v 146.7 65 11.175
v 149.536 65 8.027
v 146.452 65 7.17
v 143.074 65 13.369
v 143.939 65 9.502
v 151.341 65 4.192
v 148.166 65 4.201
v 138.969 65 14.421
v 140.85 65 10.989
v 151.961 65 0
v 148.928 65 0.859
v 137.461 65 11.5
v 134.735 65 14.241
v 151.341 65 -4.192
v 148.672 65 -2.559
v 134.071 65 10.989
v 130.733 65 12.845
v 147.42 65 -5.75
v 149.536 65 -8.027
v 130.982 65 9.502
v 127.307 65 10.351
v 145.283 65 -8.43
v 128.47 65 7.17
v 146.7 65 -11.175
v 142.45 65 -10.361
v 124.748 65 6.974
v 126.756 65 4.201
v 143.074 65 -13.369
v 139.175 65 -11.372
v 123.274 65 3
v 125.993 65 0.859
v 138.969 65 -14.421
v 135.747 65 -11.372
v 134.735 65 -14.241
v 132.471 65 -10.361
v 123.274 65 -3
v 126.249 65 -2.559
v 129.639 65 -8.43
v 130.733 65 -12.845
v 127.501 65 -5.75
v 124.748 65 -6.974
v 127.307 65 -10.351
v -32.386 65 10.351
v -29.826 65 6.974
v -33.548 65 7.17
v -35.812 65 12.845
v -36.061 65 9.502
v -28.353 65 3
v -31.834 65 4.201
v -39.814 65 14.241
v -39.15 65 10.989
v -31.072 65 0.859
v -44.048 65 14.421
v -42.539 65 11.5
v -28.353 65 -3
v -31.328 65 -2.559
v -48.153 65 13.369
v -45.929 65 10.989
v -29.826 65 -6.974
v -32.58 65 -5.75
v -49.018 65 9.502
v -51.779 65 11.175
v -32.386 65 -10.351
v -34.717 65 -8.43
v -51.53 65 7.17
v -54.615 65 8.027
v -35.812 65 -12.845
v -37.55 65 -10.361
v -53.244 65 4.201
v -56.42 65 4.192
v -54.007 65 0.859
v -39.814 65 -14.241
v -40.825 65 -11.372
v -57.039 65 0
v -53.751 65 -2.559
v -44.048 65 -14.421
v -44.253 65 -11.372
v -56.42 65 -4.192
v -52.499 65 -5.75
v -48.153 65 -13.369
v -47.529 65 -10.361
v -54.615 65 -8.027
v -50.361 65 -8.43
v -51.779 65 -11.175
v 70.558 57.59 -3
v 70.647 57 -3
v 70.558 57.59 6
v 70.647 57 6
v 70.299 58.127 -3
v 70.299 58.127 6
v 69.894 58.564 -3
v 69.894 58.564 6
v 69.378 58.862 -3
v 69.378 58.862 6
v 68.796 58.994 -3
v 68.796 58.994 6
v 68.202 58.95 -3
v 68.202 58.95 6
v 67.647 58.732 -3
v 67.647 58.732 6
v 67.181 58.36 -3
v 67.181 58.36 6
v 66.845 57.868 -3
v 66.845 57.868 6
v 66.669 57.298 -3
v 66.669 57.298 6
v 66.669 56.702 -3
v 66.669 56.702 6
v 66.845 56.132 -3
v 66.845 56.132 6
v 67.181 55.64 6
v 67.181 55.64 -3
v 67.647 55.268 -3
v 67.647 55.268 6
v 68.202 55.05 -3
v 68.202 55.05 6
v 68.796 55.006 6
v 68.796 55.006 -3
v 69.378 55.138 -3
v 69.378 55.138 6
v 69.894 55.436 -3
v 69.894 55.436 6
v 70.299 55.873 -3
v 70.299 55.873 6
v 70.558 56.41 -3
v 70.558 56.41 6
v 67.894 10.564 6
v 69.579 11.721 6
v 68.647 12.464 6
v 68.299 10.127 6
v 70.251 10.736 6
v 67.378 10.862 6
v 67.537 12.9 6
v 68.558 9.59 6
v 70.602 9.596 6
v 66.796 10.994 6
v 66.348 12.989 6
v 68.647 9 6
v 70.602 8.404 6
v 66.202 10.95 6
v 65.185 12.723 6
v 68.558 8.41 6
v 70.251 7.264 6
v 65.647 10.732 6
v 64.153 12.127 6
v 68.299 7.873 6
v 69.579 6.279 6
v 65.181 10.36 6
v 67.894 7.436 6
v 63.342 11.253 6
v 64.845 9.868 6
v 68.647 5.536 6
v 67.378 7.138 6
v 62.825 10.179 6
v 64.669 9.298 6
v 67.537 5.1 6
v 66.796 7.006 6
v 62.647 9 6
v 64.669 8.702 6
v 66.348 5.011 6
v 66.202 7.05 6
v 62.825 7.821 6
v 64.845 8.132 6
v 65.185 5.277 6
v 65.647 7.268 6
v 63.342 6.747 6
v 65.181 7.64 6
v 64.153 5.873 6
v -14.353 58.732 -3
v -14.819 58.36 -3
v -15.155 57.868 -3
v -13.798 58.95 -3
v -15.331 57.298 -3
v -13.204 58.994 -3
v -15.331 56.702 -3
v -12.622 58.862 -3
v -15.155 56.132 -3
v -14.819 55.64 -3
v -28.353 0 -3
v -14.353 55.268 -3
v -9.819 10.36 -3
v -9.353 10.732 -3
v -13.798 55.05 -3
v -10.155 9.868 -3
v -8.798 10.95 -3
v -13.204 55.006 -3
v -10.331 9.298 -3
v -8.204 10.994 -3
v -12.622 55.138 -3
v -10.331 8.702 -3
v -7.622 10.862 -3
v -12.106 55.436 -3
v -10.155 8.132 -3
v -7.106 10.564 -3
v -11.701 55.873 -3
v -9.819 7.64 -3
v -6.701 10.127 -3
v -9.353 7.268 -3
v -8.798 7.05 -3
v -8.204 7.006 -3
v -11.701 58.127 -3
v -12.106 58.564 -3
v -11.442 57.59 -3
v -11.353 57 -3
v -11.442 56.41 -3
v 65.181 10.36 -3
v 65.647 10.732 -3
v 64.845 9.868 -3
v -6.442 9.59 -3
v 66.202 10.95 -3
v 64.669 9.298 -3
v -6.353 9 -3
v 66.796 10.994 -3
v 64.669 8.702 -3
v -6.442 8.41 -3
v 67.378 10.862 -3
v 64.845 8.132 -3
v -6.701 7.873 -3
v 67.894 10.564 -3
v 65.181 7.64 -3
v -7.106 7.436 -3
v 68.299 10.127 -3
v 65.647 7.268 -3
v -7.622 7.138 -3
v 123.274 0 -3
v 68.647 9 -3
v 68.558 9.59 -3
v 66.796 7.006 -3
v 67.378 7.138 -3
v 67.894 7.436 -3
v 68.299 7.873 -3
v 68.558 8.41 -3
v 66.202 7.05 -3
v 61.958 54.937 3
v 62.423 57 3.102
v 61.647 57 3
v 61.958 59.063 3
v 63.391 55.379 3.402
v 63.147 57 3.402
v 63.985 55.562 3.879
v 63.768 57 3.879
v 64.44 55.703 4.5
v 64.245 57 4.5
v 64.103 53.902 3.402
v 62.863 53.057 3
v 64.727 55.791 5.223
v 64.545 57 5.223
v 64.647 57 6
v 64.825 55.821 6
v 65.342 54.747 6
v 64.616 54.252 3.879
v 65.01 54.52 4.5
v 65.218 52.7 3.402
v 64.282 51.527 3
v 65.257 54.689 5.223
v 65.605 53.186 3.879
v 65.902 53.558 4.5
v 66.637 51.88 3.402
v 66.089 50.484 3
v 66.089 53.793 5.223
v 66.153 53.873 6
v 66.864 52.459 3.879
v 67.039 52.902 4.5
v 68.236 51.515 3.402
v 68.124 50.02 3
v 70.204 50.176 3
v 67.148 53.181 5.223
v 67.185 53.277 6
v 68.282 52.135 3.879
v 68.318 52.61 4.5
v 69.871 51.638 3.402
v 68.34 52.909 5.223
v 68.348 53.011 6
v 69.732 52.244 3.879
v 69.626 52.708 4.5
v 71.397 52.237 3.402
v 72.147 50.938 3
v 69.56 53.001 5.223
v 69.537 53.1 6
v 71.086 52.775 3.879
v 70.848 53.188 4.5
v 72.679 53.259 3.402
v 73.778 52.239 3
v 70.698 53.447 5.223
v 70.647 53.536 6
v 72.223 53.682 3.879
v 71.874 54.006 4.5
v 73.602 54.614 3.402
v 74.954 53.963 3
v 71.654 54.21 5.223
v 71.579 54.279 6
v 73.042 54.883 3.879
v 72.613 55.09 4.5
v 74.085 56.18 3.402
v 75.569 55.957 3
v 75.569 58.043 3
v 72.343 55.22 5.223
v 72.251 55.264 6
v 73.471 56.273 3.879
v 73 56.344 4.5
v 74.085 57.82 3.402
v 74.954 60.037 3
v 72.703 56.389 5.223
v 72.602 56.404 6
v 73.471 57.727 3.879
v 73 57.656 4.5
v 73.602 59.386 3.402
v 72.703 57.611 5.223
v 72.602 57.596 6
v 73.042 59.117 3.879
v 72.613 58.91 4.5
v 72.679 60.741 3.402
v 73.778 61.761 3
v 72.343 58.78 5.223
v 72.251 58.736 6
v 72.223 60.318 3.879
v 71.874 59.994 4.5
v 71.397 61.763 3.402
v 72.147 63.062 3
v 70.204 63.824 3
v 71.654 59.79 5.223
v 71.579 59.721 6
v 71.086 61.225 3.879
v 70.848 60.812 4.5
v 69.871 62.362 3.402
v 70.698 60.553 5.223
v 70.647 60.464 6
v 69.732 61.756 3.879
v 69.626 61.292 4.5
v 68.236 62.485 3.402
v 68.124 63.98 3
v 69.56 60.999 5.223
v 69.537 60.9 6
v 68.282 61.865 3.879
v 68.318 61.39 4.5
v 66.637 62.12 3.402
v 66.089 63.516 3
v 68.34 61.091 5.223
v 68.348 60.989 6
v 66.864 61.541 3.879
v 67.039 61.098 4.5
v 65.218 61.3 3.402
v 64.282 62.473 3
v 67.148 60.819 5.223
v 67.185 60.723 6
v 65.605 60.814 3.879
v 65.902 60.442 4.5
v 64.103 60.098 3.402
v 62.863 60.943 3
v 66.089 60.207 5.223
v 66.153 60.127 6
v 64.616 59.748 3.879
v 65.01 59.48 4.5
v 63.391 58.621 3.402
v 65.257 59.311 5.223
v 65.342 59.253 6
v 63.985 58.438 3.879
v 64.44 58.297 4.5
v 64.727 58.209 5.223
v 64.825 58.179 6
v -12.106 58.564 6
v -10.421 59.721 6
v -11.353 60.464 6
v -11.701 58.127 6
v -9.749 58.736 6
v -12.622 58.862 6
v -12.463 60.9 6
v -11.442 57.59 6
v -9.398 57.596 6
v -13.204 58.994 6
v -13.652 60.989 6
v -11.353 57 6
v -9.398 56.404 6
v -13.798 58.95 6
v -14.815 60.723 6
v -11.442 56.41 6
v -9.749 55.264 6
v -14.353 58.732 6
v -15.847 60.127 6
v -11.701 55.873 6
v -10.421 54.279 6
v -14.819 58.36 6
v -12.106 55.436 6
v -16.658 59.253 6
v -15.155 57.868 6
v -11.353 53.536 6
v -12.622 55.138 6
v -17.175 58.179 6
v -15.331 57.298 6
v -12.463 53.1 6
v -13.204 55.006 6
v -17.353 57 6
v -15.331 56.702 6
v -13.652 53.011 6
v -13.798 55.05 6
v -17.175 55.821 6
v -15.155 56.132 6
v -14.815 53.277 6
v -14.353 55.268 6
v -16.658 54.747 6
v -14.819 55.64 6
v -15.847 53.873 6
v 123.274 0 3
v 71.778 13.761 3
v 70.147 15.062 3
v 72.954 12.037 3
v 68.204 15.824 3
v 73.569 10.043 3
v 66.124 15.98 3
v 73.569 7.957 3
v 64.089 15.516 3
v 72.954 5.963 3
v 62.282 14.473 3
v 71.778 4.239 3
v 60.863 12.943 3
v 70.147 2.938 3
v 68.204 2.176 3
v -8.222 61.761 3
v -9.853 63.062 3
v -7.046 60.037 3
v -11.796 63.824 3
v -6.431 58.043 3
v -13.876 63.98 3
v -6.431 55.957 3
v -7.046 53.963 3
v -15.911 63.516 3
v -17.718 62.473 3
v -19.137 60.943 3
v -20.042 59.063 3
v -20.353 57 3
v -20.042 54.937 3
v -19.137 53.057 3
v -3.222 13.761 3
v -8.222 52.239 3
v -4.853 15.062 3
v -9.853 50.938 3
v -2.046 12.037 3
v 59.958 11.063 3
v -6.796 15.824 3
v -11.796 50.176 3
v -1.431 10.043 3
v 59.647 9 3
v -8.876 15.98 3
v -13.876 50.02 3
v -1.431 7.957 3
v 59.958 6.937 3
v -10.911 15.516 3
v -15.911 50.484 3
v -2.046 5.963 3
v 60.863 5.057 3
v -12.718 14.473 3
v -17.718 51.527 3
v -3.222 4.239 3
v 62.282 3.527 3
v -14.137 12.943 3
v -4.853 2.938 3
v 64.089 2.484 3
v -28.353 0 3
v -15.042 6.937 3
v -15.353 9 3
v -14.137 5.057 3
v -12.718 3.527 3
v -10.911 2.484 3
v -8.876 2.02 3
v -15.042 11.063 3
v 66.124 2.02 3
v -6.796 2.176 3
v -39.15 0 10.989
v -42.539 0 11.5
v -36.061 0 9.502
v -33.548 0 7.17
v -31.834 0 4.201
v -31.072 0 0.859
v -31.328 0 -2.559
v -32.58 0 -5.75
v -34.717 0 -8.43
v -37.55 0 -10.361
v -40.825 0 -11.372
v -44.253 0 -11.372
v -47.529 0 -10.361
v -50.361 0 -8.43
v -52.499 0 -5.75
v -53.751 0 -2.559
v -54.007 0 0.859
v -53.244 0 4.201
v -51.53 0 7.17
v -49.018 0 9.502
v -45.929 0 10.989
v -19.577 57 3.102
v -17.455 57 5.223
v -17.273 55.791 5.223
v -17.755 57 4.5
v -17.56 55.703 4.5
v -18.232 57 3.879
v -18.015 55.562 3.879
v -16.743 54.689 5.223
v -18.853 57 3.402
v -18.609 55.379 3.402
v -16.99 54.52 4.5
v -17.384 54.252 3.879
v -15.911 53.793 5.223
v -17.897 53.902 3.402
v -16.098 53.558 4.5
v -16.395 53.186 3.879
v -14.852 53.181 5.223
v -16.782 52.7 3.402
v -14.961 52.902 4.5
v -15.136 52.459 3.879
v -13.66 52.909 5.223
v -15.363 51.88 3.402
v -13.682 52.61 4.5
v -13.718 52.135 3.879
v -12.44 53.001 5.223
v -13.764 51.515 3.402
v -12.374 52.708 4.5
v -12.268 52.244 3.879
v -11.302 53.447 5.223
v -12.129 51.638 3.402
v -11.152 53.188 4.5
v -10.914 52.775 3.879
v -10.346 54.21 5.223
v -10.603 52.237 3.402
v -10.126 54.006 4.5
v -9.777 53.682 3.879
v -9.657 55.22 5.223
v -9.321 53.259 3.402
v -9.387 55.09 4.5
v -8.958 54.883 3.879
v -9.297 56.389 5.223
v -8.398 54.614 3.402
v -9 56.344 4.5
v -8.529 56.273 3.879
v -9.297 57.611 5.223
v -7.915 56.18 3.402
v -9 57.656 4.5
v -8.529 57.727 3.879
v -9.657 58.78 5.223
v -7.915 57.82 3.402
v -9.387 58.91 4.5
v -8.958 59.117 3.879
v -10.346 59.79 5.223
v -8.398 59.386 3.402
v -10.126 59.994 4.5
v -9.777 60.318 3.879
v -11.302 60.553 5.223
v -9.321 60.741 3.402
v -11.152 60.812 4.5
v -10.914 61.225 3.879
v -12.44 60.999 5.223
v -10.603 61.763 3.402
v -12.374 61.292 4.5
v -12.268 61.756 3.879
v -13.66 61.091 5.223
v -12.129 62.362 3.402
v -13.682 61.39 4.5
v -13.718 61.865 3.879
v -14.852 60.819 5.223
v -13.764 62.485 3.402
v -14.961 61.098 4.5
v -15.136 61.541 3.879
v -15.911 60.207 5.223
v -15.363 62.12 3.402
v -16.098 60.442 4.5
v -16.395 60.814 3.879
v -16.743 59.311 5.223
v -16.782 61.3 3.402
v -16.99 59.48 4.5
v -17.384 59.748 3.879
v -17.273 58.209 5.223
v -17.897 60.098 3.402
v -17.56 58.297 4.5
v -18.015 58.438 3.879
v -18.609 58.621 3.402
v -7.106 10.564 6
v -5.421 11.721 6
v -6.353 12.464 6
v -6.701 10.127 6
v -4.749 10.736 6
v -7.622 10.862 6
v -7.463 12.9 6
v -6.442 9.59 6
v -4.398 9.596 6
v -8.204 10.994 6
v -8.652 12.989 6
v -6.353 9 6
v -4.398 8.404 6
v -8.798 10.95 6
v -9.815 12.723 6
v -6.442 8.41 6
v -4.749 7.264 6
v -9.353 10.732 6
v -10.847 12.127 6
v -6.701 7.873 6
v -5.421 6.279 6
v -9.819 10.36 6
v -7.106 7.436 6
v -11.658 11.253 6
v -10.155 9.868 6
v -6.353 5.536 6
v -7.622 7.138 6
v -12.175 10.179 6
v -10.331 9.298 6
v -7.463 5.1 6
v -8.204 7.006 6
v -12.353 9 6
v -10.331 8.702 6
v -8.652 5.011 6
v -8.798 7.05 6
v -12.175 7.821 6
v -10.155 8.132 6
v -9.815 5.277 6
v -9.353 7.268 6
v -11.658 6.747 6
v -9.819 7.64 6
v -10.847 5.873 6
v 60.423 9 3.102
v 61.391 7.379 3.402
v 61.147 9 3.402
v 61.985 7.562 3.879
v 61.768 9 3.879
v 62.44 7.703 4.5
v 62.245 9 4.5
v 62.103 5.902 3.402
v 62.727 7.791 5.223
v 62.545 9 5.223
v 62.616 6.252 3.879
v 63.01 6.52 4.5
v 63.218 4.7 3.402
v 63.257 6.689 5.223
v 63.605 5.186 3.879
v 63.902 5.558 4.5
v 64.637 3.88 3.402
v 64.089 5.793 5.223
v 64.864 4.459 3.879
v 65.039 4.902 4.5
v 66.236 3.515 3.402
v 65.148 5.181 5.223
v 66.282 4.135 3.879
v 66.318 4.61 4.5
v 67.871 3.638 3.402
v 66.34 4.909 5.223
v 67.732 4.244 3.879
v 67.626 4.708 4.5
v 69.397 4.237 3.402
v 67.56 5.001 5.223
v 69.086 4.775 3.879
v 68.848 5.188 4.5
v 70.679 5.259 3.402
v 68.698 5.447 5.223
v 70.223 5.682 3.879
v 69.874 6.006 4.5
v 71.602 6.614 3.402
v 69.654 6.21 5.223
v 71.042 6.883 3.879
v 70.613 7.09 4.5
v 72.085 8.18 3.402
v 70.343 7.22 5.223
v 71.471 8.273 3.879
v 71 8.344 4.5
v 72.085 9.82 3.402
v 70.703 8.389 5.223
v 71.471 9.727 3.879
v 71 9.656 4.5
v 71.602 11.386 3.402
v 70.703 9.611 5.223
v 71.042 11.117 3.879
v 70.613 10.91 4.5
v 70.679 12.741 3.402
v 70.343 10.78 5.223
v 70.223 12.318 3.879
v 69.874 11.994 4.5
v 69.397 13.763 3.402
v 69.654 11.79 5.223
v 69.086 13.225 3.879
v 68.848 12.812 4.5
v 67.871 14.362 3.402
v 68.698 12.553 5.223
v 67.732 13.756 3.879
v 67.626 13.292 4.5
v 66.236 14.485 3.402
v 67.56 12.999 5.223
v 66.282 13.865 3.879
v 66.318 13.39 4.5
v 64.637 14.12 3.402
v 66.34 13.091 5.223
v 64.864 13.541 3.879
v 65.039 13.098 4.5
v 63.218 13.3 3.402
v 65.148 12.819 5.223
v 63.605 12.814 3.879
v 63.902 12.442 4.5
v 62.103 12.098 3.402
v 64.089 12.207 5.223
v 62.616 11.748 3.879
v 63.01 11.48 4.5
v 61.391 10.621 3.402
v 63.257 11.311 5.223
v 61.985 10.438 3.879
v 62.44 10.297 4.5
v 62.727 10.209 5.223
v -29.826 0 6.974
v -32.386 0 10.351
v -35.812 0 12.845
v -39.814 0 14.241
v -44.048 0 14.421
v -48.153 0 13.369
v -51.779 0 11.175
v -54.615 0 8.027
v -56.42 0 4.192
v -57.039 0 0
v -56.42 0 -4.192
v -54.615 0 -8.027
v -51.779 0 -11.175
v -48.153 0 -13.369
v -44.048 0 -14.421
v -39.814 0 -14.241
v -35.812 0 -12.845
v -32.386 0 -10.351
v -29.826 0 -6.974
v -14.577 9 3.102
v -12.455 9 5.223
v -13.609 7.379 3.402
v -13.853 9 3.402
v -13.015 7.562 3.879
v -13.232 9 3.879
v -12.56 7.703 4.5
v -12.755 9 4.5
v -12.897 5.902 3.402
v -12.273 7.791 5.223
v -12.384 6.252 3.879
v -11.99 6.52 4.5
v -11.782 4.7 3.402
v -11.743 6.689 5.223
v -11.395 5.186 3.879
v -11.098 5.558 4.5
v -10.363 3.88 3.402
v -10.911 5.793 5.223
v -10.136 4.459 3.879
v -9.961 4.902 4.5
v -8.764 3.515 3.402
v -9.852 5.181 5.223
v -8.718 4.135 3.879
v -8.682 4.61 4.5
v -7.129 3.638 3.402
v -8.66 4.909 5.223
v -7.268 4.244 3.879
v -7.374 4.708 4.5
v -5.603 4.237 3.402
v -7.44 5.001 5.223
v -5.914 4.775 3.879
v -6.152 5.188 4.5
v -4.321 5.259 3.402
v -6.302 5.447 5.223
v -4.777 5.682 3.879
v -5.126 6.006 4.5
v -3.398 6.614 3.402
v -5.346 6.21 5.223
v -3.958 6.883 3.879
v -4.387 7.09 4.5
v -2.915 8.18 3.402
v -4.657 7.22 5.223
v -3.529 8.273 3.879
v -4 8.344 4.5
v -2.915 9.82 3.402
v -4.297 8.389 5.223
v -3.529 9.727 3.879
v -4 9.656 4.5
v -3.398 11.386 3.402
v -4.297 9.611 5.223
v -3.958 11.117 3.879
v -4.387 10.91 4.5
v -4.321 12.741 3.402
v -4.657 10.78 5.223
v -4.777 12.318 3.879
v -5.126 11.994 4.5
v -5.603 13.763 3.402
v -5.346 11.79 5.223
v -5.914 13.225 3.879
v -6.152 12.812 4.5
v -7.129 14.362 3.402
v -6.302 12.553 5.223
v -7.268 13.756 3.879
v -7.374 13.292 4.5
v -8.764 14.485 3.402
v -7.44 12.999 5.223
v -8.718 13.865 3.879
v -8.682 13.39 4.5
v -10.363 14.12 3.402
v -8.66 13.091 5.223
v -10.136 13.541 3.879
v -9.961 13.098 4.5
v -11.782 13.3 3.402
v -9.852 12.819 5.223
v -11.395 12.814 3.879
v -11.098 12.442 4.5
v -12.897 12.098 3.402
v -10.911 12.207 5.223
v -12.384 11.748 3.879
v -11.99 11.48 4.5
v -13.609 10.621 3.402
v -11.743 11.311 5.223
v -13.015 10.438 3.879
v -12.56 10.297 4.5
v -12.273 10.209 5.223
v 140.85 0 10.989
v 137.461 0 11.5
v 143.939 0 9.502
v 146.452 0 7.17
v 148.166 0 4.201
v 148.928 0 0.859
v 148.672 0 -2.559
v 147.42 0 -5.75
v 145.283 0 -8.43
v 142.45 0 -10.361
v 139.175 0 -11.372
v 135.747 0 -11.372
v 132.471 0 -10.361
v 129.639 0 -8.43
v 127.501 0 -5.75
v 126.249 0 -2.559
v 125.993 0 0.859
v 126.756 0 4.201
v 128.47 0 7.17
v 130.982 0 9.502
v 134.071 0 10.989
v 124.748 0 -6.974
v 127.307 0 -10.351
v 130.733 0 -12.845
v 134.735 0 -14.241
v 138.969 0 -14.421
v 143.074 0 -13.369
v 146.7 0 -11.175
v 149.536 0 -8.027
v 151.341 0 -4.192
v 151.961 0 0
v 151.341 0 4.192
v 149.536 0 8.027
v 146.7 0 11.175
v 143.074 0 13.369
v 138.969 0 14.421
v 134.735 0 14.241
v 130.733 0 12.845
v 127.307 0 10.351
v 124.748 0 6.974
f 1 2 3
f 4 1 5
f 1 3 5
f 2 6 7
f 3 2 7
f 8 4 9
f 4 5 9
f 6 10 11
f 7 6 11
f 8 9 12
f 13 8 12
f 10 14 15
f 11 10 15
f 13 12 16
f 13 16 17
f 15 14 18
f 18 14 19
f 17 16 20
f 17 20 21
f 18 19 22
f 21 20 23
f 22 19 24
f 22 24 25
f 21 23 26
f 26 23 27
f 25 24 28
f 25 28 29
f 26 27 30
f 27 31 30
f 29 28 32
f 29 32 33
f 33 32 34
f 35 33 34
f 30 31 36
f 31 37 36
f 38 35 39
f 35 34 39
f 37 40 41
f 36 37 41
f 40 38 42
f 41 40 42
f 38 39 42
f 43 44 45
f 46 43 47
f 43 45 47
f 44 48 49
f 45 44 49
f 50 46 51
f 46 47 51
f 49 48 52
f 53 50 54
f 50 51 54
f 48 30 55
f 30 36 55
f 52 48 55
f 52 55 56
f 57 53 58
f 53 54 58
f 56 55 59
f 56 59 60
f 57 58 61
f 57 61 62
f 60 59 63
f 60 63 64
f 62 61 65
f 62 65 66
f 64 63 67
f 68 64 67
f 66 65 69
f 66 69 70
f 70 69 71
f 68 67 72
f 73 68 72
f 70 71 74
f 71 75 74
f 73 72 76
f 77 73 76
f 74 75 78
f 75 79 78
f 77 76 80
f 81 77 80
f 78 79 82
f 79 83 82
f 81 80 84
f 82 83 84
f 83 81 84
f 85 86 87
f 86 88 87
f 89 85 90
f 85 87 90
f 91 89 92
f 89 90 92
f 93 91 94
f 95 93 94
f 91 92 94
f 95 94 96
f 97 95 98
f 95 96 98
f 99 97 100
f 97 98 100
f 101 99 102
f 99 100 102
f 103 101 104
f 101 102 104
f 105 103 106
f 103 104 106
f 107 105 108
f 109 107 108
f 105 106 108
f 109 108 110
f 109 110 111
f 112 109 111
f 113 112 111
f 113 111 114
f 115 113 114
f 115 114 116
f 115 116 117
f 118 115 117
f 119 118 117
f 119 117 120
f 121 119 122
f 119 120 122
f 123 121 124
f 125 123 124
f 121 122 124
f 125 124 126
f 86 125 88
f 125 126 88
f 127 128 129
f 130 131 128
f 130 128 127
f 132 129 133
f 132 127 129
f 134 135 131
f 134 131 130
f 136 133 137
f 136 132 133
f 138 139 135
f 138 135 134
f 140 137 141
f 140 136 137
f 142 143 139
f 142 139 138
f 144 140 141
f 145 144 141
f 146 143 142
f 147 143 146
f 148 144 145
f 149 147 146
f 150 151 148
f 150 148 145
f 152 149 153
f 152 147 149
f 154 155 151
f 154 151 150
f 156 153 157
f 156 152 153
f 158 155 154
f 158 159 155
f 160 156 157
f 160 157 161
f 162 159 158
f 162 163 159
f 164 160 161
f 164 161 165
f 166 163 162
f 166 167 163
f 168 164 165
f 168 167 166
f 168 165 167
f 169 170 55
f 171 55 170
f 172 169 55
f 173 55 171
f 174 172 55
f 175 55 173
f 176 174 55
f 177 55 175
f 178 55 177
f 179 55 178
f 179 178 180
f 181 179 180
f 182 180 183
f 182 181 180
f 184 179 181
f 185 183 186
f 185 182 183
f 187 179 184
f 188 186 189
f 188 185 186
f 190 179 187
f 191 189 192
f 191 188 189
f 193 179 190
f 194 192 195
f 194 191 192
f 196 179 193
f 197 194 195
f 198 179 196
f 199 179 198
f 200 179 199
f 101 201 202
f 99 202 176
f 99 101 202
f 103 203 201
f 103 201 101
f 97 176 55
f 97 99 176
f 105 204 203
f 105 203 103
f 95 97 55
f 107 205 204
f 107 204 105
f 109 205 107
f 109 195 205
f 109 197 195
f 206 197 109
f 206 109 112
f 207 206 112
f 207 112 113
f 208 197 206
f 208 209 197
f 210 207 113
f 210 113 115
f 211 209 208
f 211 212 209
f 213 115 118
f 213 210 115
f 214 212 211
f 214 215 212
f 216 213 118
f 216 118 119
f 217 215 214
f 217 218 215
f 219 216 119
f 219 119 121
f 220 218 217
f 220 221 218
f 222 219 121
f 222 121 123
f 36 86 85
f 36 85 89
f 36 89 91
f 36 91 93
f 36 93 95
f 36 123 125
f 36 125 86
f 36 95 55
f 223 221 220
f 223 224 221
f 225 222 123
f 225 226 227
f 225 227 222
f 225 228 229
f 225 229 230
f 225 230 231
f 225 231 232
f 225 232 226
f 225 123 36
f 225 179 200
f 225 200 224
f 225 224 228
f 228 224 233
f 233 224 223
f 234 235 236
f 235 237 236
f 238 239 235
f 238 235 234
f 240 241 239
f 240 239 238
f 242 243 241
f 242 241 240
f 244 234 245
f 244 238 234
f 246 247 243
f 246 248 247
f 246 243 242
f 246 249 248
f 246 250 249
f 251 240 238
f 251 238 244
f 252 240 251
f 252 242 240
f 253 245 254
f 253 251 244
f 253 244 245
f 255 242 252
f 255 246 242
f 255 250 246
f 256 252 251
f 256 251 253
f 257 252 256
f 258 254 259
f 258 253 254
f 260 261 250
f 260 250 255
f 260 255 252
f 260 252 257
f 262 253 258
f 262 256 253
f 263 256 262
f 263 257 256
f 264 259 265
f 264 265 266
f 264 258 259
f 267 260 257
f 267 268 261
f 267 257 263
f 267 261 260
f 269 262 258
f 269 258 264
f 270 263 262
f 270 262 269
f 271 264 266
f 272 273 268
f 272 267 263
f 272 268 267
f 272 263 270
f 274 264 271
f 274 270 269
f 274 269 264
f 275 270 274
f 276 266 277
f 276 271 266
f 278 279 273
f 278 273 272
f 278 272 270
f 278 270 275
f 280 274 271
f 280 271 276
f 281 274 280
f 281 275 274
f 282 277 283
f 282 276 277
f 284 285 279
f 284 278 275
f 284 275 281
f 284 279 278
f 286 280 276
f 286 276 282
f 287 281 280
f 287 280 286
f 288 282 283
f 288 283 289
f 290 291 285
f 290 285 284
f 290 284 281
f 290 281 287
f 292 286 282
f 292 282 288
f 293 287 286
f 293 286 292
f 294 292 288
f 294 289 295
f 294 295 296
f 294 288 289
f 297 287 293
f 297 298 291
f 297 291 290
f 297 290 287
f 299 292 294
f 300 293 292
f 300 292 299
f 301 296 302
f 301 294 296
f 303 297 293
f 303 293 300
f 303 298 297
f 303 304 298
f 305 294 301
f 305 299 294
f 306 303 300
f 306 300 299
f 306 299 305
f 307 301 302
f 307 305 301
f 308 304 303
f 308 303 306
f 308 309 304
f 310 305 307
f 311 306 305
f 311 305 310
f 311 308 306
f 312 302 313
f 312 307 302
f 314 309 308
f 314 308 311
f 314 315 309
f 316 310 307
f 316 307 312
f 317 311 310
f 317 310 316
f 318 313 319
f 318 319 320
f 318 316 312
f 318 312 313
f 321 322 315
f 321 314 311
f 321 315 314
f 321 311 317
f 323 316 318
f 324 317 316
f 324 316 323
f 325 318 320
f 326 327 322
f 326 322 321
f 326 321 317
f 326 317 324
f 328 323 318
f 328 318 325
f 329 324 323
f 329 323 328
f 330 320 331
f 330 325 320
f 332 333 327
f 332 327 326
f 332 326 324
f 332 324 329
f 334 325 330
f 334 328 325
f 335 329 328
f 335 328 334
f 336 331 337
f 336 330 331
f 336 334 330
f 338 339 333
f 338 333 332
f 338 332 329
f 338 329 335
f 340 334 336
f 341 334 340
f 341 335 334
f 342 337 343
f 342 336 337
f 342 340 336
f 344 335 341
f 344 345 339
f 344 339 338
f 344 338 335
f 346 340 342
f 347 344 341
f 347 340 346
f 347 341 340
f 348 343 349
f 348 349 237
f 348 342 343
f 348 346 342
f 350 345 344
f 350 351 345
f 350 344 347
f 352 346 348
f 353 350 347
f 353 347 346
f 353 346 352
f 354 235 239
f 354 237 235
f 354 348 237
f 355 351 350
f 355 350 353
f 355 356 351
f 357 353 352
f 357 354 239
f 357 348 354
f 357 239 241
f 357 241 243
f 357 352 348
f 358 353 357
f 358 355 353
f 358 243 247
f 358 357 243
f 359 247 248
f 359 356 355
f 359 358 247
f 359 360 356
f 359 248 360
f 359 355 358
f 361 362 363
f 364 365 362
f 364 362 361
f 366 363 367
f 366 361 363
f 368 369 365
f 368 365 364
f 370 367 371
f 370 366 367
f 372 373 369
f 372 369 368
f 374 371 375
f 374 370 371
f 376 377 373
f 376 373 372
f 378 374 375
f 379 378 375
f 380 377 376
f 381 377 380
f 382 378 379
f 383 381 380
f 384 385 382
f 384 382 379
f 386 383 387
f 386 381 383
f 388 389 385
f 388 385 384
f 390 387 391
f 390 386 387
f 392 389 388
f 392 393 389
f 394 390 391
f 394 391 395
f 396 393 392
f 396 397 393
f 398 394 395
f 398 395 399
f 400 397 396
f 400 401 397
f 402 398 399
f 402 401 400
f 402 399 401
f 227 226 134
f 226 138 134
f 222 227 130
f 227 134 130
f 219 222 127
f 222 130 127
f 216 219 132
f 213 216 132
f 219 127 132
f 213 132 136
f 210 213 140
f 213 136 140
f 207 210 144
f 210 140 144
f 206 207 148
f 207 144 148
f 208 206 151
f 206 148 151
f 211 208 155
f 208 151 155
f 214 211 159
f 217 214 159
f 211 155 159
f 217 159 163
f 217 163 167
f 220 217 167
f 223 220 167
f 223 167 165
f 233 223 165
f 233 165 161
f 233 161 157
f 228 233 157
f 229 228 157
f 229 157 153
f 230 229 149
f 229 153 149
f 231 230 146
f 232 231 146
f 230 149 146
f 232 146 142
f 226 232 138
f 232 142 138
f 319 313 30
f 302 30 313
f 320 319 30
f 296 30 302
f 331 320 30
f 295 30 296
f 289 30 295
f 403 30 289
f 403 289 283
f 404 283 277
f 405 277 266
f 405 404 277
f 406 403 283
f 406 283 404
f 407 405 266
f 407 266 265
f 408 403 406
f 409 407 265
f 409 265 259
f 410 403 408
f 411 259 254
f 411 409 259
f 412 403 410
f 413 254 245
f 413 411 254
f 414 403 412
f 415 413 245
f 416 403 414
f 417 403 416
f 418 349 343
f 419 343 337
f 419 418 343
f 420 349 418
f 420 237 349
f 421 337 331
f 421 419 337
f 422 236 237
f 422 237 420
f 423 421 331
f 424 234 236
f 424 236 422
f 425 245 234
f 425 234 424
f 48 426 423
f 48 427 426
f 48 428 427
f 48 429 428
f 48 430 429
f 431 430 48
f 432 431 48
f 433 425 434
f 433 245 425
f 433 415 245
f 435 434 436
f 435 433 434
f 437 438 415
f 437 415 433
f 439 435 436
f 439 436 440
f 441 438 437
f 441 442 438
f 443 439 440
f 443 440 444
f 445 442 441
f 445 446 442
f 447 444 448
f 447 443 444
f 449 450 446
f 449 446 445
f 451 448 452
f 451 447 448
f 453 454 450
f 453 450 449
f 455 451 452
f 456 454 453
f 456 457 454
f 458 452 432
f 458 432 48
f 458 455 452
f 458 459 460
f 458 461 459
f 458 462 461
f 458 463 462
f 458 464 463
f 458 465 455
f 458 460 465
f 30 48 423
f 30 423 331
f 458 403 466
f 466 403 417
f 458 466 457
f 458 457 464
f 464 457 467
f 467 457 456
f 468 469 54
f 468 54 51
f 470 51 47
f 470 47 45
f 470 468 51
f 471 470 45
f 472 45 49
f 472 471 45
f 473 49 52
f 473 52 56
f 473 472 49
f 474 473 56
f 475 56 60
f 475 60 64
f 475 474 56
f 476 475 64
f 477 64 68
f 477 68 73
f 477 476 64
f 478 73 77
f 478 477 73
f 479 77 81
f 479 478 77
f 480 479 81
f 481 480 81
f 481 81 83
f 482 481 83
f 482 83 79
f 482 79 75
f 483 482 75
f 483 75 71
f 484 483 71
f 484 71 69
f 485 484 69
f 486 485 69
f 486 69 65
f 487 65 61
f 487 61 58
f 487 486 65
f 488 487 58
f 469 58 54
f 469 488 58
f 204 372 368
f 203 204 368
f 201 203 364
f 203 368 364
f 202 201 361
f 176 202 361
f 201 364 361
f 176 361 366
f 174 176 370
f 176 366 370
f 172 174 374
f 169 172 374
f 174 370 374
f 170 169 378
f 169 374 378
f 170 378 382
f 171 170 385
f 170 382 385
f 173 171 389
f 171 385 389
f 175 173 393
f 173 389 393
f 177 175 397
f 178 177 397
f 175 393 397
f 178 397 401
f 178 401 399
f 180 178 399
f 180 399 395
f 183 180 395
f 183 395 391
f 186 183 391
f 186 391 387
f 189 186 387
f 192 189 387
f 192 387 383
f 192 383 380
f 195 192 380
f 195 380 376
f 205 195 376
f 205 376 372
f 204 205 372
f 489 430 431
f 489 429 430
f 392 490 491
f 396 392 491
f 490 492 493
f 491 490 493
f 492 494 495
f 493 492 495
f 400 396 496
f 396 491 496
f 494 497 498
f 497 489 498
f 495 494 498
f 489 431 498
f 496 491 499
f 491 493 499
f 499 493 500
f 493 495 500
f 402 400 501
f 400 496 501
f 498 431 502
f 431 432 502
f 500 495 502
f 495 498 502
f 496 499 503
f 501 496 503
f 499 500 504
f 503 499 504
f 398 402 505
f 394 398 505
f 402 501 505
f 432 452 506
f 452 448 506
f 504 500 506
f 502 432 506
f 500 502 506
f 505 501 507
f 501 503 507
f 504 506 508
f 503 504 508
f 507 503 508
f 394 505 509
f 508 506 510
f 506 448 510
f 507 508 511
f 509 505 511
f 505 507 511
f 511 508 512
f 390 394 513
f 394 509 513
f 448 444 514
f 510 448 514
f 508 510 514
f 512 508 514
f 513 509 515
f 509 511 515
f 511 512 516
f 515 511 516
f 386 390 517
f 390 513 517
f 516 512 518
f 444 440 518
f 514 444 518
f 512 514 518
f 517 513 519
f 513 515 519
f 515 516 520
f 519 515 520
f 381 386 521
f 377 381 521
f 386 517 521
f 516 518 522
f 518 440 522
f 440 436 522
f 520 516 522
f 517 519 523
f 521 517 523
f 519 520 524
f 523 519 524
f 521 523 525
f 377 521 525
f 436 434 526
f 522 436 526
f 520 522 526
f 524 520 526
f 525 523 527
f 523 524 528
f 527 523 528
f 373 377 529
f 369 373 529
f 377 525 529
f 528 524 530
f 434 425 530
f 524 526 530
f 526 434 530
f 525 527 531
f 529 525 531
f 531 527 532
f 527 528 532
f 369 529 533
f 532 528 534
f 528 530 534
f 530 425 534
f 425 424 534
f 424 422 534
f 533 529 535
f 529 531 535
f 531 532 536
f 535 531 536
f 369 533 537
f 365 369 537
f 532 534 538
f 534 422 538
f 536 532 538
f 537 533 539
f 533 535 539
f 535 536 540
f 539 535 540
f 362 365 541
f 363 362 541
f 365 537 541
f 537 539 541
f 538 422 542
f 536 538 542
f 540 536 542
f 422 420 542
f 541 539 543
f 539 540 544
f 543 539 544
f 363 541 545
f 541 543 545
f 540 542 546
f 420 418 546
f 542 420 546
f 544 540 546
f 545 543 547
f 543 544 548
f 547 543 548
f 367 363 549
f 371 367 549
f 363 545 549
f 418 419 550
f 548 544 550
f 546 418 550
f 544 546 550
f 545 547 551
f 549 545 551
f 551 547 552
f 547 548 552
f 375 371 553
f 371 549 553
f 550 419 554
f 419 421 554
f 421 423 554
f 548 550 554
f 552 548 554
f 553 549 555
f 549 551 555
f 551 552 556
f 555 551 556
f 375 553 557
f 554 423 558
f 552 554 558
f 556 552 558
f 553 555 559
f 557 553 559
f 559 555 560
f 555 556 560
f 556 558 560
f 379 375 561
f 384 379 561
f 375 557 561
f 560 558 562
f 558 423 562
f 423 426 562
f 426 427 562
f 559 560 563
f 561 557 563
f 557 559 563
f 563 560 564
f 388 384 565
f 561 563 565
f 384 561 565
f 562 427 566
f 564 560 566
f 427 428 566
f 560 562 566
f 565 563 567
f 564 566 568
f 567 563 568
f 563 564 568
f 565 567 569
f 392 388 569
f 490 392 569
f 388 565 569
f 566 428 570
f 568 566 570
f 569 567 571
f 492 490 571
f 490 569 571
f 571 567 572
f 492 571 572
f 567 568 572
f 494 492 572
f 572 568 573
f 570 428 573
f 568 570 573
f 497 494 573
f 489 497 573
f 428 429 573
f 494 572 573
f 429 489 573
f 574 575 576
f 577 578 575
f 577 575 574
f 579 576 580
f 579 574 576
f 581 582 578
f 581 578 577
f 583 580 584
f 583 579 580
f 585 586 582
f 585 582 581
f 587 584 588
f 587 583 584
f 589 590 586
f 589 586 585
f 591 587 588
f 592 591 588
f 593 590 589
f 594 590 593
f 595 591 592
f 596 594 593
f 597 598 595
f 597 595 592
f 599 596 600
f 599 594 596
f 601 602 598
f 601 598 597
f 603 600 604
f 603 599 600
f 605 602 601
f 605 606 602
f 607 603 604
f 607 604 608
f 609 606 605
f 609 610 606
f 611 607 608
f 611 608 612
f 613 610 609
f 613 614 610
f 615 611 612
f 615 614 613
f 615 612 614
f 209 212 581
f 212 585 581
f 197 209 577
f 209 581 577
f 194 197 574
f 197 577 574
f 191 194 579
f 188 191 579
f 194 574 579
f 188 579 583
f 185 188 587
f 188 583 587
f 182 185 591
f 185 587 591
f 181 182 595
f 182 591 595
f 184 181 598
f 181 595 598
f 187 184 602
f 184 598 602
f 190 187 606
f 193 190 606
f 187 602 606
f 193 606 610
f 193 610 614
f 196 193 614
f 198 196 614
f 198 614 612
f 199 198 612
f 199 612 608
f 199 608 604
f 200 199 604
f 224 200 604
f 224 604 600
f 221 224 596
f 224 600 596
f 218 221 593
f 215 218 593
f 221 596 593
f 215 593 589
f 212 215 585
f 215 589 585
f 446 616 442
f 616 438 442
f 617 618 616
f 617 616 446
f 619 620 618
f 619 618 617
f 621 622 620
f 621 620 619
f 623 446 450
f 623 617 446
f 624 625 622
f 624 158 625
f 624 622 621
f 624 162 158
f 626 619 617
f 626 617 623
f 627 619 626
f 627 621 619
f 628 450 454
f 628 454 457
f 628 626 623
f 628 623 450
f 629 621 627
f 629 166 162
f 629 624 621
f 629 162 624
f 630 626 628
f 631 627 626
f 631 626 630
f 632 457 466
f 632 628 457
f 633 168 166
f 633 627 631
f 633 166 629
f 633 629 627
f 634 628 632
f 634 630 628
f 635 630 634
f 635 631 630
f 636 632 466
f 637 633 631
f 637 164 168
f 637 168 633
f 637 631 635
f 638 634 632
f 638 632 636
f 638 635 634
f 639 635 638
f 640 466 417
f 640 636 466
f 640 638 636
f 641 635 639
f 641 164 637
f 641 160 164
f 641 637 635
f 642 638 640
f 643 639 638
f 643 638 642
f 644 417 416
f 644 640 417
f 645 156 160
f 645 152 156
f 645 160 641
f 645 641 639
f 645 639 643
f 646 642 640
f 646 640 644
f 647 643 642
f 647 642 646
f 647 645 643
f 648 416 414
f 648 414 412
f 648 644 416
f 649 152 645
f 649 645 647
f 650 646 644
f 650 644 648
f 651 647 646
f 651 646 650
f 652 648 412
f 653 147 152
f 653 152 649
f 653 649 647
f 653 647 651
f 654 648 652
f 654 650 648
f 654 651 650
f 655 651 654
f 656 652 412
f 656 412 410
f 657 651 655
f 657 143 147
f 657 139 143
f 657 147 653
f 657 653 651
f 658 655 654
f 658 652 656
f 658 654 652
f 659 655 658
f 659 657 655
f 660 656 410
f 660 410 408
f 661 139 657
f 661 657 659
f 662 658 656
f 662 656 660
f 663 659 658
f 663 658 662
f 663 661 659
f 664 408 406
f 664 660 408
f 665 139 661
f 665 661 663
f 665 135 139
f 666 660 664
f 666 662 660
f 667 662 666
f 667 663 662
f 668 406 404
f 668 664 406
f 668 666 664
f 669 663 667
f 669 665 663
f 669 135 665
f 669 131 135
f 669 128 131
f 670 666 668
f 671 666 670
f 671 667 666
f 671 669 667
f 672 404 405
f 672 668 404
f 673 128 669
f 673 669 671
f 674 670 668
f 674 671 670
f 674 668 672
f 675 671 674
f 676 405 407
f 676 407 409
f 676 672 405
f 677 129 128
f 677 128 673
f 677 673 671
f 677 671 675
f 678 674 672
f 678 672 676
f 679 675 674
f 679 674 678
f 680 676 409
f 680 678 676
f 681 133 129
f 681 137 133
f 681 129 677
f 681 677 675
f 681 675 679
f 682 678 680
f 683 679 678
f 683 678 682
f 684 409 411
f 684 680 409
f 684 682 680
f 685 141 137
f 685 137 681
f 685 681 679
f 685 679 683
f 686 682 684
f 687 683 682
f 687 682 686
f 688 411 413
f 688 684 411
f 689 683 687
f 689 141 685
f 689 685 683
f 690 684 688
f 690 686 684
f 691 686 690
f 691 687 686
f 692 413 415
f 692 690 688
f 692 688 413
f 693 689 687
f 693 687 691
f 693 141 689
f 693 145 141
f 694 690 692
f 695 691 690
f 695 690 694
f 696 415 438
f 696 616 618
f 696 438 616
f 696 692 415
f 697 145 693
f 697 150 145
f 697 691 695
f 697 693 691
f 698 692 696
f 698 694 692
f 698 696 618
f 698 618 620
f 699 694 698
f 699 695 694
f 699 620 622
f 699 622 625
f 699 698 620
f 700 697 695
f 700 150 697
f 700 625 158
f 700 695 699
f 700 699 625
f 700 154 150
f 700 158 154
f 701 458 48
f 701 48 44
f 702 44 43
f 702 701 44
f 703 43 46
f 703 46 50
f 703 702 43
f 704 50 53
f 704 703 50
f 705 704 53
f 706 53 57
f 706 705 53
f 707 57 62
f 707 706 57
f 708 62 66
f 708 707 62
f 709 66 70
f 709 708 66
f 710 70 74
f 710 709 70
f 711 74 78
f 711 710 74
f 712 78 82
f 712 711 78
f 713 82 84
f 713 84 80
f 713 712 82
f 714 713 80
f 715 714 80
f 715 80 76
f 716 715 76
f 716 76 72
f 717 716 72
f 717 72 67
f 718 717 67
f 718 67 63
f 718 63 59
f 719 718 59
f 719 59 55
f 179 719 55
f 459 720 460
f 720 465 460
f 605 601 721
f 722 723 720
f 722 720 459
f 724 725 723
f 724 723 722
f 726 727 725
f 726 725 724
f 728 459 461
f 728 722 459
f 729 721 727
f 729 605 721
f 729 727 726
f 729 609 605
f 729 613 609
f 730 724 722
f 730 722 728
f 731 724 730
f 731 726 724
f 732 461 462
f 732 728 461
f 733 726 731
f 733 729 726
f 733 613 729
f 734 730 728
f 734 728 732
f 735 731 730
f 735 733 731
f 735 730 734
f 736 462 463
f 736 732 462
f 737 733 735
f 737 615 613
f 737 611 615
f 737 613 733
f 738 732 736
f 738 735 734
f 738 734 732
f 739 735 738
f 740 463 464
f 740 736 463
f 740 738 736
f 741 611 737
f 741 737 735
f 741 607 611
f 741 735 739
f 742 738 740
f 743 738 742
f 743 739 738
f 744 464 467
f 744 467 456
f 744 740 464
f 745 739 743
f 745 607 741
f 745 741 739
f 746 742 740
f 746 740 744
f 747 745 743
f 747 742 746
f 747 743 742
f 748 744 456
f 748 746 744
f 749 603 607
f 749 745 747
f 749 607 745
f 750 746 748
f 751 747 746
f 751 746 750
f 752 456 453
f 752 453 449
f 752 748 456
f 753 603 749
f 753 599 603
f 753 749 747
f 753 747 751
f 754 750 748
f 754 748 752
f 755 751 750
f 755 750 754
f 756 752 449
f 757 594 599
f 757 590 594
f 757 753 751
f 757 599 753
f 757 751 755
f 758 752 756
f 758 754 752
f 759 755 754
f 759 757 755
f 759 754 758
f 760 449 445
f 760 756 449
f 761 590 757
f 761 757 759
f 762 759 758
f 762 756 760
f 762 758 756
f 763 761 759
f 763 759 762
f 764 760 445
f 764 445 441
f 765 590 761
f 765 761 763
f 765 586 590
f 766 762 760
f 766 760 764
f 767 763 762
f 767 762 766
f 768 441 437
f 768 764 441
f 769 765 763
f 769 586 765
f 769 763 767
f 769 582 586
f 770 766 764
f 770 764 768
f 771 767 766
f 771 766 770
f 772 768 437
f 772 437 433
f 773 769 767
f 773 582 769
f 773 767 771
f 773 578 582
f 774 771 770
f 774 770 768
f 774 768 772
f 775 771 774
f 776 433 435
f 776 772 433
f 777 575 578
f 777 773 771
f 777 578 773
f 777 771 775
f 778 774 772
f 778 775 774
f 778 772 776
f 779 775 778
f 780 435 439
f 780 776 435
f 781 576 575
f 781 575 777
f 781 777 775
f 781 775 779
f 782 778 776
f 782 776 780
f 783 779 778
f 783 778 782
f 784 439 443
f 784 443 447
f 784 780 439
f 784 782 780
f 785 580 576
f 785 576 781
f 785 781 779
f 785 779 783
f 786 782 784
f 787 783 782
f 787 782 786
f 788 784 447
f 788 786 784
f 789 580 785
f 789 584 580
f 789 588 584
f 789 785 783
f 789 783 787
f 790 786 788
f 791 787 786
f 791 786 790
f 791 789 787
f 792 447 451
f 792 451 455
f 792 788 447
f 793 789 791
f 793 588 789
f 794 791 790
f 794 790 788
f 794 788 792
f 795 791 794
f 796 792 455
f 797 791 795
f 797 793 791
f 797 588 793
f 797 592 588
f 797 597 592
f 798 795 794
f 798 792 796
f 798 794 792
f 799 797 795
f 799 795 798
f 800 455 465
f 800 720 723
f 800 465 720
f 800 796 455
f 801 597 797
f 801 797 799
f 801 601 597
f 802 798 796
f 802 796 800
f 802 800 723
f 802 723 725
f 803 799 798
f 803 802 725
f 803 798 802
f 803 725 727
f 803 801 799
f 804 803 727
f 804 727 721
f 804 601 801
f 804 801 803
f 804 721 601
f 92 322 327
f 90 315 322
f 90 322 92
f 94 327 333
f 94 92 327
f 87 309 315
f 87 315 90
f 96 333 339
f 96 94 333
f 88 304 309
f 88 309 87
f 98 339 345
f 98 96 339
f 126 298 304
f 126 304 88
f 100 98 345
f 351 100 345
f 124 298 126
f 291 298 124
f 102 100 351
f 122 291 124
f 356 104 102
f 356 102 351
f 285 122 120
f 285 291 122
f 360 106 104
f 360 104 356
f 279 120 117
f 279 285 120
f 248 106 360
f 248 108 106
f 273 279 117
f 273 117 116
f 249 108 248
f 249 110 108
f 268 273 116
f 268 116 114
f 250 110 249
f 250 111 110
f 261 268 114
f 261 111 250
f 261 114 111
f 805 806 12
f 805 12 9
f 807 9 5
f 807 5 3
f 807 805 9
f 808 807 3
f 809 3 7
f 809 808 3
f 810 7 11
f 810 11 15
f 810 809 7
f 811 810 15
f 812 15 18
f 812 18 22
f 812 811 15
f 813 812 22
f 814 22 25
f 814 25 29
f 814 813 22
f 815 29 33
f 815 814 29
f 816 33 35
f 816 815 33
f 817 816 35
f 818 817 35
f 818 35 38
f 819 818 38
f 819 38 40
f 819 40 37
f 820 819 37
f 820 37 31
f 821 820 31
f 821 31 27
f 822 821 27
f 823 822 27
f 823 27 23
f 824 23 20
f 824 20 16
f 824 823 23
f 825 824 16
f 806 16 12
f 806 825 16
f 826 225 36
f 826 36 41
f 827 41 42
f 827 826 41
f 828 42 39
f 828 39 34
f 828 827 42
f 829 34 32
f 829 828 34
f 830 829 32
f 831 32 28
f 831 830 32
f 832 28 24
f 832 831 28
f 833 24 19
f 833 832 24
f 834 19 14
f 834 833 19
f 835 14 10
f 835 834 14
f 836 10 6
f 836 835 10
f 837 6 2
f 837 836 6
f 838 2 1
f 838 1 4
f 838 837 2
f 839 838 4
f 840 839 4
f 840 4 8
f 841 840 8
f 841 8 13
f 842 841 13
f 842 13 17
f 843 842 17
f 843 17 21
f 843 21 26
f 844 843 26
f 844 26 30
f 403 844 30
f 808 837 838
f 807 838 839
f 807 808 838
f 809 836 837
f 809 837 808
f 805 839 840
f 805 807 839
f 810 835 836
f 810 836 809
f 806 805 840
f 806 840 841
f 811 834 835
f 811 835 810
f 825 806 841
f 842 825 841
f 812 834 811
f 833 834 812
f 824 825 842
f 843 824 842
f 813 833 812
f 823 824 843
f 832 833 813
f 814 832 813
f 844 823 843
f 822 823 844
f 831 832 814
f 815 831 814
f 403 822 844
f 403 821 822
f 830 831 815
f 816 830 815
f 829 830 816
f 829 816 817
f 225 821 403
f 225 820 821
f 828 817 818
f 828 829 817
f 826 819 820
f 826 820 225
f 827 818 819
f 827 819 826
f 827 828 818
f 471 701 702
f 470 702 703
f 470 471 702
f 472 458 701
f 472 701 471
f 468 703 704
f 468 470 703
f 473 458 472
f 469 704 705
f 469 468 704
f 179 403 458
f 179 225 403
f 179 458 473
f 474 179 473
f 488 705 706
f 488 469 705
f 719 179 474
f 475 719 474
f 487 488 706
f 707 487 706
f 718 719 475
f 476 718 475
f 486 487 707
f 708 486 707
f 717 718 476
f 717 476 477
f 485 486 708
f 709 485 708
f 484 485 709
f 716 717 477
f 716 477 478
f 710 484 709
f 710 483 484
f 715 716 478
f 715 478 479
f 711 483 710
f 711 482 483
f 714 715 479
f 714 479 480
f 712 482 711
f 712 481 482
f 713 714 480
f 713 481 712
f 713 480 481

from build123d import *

# Parameters (mm, degrees)
SKETCH1_R           = 11.5
BOSS_EXTRUDE1_DEPTH = 65
SKETCH2_R           = 2
CUT_EXTRUDE1_DEPTH  = 10
BOSS_EXTRUDE2_START = 3
SKETCH3_R           = 4
SKETCH3_R_2         = 2
BOSS_EXTRUDE2_DEPTH = 3
FILLET1_R           = 3


with BuildPart() as part:
    # Sketch1 → Boss-Extrude1 (new body)
    with BuildSketch(Plane(origin=(0, 0, 0), x_dir=(1, 0, 0), z_dir=(0, 1, 0))):
        with BuildLine():
            Line((-28.353157483, 3), (123.274320599, 3))
            ThreePointArc((123.274320599, 3), (151.960581558, 0), (123.274320599, -3))
            Line((123.274320599, -3), (-28.353157483, -3))
            ThreePointArc((-28.353157483, -3), (-57.039418442, 0), (-28.353157483, 3))
        make_face()
        with Locations(Location((-42.539418442, 0, 0), (0, 0, 270))):
            Circle(SKETCH1_R, mode=Mode.SUBTRACT)
        with Locations(Location((137.460581558, 0, 0), (0, 0, 270))):
            Circle(SKETCH1_R, mode=Mode.SUBTRACT)
    extrude(amount=BOSS_EXTRUDE1_DEPTH)

    # Sketch2 → Cut-Extrude1 (cut)
    with BuildSketch(Plane.XY.offset(3)):
        with Locations((-13.353157483, 57)):
            Circle(SKETCH2_R)
        with Locations((-8.353157483, 9)):
            Circle(SKETCH2_R)
        with Locations((66.646842517, 9)):
            Circle(SKETCH2_R)
        with Locations((68.646842517, 57)):
            Circle(SKETCH2_R)
    extrude(amount=-CUT_EXTRUDE1_DEPTH, mode=Mode.SUBTRACT)

    # Sketch3 → Boss-Extrude2 (add)
    # profile 1 of 4: a face of its own
    with BuildSketch(Plane.XY.offset(3).offset(BOSS_EXTRUDE2_START)):
        with Locations(Location((-13.353157483, 57, 0), (0, 0, 180))):
            Circle(SKETCH3_R)
        with Locations((-13.353157483, 57)):
            Circle(SKETCH3_R_2, mode=Mode.SUBTRACT)
    # profile 2 of 4: a face of its own
    with BuildSketch(Plane.XY.offset(3).offset(BOSS_EXTRUDE2_START)):
        with Locations(Location((68.646842517, 57, 0), (0, 0, 180))):
            Circle(SKETCH3_R)
        with Locations((68.646842517, 57)):
            Circle(SKETCH3_R_2, mode=Mode.SUBTRACT)
    # profile 3 of 4: a face of its own
    with BuildSketch(Plane.XY.offset(3).offset(BOSS_EXTRUDE2_START)):
        with Locations(Location((-8.353157483, 9, 0), (0, 0, 180))):
            Circle(SKETCH3_R)
        with Locations((-8.353157483, 9)):
            Circle(SKETCH3_R_2, mode=Mode.SUBTRACT)
    # profile 4 of 4: a face of its own
    with BuildSketch(Plane.XY.offset(3).offset(BOSS_EXTRUDE2_START)):
        with Locations(Location((66.646842517, 9, 0), (0, 0, 180))):
            Circle(SKETCH3_R)
        with Locations((66.646842517, 9)):
            Circle(SKETCH3_R_2, mode=Mode.SUBTRACT)
    extrude(amount=-BOSS_EXTRUDE2_DEPTH)

    # Fillet1
    fillet1_edges = [part.edges().sort_by_distance(p)[0] for p in [
        (-9.353157483, 57, 3),
        (72.646842517, 57, 3),
        (-4.353157483, 9, 3),
        (70.646842517, 9, 3),
    ]]
    fillet(fillet1_edges, radius=FILLET1_R - 0.0001)  # a hair under: the kernel refuses the full size


solid = part.part
